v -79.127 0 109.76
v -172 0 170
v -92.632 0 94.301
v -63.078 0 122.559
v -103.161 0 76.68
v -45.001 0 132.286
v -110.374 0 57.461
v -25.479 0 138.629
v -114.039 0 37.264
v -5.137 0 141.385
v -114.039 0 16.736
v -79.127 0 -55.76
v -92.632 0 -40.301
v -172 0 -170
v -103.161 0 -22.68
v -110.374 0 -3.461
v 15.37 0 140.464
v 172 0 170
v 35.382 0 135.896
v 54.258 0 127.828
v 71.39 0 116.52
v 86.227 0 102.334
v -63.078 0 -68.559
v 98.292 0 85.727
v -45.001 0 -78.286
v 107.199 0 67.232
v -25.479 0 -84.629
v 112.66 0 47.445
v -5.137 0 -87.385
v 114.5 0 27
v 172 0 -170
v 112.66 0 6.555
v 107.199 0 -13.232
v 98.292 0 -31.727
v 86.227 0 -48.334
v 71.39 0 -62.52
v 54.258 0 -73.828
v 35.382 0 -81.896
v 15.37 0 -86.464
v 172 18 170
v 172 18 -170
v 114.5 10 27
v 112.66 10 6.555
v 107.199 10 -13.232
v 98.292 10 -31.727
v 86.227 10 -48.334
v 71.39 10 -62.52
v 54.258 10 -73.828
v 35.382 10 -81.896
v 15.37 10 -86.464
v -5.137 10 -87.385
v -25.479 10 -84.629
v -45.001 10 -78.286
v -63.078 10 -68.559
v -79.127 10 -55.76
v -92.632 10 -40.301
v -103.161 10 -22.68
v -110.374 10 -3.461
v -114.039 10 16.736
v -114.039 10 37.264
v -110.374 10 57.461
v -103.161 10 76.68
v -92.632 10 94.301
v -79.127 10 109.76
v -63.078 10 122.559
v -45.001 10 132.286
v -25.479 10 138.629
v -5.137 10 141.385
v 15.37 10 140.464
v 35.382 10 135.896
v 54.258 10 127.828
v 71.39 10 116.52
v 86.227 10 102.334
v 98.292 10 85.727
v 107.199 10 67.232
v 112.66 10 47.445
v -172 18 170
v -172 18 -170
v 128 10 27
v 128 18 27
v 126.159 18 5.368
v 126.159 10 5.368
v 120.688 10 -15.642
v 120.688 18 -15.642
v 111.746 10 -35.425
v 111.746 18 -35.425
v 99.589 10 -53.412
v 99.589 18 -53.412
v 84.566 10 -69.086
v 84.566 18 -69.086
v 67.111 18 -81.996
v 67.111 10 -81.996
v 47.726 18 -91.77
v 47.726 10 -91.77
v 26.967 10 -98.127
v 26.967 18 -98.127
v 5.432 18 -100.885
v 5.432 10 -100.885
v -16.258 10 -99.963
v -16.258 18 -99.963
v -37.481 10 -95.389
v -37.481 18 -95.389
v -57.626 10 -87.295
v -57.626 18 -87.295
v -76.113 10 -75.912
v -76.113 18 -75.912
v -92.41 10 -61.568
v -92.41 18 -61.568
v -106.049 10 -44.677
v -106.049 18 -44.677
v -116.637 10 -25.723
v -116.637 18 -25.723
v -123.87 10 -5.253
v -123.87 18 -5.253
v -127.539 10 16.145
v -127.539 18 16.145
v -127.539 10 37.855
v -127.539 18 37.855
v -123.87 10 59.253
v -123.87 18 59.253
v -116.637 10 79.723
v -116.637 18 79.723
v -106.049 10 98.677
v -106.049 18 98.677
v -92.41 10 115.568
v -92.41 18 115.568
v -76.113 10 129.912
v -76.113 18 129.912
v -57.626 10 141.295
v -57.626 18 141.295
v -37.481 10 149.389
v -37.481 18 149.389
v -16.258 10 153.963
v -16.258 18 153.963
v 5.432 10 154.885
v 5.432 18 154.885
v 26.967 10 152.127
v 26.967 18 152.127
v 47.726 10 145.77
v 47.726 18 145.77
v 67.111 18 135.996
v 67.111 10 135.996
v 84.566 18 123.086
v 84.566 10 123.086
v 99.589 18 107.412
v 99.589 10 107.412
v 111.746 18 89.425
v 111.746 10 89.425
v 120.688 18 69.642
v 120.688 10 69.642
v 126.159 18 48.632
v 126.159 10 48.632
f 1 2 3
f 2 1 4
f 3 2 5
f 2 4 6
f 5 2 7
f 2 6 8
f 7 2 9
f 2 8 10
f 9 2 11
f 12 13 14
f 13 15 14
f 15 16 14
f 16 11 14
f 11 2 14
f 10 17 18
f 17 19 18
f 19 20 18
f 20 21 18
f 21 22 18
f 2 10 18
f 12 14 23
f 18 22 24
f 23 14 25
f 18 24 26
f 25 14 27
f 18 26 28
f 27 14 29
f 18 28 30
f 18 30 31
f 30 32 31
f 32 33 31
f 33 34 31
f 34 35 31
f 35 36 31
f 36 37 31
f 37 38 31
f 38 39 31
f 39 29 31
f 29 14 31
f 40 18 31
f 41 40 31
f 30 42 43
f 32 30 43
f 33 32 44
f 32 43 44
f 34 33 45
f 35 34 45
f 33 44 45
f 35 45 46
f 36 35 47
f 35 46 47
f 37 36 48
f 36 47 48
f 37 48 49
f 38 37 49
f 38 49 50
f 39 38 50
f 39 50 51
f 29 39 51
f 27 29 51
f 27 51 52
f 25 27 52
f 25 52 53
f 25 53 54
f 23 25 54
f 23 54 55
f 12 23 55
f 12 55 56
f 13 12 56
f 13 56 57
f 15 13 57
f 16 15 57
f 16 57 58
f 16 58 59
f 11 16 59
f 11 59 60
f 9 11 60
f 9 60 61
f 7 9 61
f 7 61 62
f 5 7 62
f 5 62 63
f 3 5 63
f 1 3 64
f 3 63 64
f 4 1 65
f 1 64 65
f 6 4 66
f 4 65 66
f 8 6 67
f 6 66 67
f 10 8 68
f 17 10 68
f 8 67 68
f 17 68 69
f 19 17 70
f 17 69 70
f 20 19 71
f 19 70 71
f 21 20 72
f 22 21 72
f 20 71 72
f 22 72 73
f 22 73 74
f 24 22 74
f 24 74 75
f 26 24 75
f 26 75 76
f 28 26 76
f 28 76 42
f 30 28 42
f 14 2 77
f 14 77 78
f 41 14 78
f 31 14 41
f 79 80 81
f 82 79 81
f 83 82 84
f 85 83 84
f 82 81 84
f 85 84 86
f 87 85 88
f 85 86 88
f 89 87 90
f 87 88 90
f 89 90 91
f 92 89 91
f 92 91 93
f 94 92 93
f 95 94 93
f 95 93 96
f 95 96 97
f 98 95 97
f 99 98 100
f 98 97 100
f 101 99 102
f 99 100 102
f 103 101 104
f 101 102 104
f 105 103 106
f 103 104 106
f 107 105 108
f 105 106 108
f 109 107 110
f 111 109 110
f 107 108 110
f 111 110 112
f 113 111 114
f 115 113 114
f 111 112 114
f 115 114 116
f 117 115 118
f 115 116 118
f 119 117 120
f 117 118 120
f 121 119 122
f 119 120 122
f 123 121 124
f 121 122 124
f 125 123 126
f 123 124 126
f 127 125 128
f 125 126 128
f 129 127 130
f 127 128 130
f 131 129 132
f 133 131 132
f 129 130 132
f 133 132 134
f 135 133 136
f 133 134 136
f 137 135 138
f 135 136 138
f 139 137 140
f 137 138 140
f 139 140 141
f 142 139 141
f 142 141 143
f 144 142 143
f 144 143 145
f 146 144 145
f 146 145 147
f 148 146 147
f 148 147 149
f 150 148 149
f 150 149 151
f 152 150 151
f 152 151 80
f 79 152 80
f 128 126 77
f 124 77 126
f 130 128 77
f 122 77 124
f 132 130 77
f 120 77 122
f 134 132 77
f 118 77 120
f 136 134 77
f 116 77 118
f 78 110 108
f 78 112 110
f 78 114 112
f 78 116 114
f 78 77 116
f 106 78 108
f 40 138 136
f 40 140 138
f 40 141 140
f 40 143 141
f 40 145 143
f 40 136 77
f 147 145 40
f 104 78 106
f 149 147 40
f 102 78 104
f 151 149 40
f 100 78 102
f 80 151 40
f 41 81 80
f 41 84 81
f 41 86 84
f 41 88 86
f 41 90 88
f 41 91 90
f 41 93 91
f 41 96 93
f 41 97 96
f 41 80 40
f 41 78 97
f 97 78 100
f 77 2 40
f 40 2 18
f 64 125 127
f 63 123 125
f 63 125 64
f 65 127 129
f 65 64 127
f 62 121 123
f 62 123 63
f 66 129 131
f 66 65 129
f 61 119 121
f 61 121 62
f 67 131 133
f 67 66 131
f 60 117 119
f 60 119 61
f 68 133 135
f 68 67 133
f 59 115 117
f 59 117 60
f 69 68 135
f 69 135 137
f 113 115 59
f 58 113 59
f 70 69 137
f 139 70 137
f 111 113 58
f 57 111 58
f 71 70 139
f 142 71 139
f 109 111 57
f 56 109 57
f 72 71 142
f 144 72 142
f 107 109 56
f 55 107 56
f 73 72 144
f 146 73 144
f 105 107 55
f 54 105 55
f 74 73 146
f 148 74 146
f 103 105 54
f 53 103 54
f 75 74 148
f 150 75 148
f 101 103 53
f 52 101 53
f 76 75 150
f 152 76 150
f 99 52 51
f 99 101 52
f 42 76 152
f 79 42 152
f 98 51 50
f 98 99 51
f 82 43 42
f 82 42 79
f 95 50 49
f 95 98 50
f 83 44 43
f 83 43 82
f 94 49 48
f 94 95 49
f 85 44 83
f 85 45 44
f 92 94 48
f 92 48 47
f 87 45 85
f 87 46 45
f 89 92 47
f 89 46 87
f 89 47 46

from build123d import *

# Parameters (mm, degrees)
SKETCH_1_W               = 344
SKETCH_1_H               = 340
EXTRUDE_1_DEPTH          = 18
SKETCH_2_R               = 114.5
CUT_EXTRUDE_1_DEPTH      = 1
CUT_EXTRUDE_1_DEPTH_BACK = 19
SKETCH_3_R               = 128
CUT_EXTRUDE_2_DEPTH      = 8


with BuildPart() as part:
    # Эскиз1 → Бобышка-Вытянуть1 (new body)
    with BuildSketch(Plane(origin=(0, 0, 0), x_dir=(1, 0, 0), z_dir=(0, 1, 0))):
        Rectangle(SKETCH_1_W, SKETCH_1_H)
    extrude(amount=EXTRUDE_1_DEPTH)

    # Эскиз2 → Вырез-Вытянуть1 (cut, two sides)
    with BuildSketch(Plane(origin=(0, 18, 0), x_dir=(1, 0, 0), z_dir=(0, 1, 0))) as cut_extrude_1_sk:
        with Locations((0, -27)):
            Circle(SKETCH_2_R)
    extrude(amount=CUT_EXTRUDE_1_DEPTH, mode=Mode.SUBTRACT)
    extrude(cut_extrude_1_sk.sketch, amount=-CUT_EXTRUDE_1_DEPTH_BACK, mode=Mode.SUBTRACT)

    # Эскиз3 → Вырез-Вытянуть2 (cut)
    with BuildSketch(Plane(origin=(0, 18, 0), x_dir=(1, 0, 0), z_dir=(0, 1, 0))):
        with Locations((0, -27)):
            Circle(SKETCH_3_R)
    extrude(amount=-CUT_EXTRUDE_2_DEPTH, mode=Mode.SUBTRACT)


solid = part.part
